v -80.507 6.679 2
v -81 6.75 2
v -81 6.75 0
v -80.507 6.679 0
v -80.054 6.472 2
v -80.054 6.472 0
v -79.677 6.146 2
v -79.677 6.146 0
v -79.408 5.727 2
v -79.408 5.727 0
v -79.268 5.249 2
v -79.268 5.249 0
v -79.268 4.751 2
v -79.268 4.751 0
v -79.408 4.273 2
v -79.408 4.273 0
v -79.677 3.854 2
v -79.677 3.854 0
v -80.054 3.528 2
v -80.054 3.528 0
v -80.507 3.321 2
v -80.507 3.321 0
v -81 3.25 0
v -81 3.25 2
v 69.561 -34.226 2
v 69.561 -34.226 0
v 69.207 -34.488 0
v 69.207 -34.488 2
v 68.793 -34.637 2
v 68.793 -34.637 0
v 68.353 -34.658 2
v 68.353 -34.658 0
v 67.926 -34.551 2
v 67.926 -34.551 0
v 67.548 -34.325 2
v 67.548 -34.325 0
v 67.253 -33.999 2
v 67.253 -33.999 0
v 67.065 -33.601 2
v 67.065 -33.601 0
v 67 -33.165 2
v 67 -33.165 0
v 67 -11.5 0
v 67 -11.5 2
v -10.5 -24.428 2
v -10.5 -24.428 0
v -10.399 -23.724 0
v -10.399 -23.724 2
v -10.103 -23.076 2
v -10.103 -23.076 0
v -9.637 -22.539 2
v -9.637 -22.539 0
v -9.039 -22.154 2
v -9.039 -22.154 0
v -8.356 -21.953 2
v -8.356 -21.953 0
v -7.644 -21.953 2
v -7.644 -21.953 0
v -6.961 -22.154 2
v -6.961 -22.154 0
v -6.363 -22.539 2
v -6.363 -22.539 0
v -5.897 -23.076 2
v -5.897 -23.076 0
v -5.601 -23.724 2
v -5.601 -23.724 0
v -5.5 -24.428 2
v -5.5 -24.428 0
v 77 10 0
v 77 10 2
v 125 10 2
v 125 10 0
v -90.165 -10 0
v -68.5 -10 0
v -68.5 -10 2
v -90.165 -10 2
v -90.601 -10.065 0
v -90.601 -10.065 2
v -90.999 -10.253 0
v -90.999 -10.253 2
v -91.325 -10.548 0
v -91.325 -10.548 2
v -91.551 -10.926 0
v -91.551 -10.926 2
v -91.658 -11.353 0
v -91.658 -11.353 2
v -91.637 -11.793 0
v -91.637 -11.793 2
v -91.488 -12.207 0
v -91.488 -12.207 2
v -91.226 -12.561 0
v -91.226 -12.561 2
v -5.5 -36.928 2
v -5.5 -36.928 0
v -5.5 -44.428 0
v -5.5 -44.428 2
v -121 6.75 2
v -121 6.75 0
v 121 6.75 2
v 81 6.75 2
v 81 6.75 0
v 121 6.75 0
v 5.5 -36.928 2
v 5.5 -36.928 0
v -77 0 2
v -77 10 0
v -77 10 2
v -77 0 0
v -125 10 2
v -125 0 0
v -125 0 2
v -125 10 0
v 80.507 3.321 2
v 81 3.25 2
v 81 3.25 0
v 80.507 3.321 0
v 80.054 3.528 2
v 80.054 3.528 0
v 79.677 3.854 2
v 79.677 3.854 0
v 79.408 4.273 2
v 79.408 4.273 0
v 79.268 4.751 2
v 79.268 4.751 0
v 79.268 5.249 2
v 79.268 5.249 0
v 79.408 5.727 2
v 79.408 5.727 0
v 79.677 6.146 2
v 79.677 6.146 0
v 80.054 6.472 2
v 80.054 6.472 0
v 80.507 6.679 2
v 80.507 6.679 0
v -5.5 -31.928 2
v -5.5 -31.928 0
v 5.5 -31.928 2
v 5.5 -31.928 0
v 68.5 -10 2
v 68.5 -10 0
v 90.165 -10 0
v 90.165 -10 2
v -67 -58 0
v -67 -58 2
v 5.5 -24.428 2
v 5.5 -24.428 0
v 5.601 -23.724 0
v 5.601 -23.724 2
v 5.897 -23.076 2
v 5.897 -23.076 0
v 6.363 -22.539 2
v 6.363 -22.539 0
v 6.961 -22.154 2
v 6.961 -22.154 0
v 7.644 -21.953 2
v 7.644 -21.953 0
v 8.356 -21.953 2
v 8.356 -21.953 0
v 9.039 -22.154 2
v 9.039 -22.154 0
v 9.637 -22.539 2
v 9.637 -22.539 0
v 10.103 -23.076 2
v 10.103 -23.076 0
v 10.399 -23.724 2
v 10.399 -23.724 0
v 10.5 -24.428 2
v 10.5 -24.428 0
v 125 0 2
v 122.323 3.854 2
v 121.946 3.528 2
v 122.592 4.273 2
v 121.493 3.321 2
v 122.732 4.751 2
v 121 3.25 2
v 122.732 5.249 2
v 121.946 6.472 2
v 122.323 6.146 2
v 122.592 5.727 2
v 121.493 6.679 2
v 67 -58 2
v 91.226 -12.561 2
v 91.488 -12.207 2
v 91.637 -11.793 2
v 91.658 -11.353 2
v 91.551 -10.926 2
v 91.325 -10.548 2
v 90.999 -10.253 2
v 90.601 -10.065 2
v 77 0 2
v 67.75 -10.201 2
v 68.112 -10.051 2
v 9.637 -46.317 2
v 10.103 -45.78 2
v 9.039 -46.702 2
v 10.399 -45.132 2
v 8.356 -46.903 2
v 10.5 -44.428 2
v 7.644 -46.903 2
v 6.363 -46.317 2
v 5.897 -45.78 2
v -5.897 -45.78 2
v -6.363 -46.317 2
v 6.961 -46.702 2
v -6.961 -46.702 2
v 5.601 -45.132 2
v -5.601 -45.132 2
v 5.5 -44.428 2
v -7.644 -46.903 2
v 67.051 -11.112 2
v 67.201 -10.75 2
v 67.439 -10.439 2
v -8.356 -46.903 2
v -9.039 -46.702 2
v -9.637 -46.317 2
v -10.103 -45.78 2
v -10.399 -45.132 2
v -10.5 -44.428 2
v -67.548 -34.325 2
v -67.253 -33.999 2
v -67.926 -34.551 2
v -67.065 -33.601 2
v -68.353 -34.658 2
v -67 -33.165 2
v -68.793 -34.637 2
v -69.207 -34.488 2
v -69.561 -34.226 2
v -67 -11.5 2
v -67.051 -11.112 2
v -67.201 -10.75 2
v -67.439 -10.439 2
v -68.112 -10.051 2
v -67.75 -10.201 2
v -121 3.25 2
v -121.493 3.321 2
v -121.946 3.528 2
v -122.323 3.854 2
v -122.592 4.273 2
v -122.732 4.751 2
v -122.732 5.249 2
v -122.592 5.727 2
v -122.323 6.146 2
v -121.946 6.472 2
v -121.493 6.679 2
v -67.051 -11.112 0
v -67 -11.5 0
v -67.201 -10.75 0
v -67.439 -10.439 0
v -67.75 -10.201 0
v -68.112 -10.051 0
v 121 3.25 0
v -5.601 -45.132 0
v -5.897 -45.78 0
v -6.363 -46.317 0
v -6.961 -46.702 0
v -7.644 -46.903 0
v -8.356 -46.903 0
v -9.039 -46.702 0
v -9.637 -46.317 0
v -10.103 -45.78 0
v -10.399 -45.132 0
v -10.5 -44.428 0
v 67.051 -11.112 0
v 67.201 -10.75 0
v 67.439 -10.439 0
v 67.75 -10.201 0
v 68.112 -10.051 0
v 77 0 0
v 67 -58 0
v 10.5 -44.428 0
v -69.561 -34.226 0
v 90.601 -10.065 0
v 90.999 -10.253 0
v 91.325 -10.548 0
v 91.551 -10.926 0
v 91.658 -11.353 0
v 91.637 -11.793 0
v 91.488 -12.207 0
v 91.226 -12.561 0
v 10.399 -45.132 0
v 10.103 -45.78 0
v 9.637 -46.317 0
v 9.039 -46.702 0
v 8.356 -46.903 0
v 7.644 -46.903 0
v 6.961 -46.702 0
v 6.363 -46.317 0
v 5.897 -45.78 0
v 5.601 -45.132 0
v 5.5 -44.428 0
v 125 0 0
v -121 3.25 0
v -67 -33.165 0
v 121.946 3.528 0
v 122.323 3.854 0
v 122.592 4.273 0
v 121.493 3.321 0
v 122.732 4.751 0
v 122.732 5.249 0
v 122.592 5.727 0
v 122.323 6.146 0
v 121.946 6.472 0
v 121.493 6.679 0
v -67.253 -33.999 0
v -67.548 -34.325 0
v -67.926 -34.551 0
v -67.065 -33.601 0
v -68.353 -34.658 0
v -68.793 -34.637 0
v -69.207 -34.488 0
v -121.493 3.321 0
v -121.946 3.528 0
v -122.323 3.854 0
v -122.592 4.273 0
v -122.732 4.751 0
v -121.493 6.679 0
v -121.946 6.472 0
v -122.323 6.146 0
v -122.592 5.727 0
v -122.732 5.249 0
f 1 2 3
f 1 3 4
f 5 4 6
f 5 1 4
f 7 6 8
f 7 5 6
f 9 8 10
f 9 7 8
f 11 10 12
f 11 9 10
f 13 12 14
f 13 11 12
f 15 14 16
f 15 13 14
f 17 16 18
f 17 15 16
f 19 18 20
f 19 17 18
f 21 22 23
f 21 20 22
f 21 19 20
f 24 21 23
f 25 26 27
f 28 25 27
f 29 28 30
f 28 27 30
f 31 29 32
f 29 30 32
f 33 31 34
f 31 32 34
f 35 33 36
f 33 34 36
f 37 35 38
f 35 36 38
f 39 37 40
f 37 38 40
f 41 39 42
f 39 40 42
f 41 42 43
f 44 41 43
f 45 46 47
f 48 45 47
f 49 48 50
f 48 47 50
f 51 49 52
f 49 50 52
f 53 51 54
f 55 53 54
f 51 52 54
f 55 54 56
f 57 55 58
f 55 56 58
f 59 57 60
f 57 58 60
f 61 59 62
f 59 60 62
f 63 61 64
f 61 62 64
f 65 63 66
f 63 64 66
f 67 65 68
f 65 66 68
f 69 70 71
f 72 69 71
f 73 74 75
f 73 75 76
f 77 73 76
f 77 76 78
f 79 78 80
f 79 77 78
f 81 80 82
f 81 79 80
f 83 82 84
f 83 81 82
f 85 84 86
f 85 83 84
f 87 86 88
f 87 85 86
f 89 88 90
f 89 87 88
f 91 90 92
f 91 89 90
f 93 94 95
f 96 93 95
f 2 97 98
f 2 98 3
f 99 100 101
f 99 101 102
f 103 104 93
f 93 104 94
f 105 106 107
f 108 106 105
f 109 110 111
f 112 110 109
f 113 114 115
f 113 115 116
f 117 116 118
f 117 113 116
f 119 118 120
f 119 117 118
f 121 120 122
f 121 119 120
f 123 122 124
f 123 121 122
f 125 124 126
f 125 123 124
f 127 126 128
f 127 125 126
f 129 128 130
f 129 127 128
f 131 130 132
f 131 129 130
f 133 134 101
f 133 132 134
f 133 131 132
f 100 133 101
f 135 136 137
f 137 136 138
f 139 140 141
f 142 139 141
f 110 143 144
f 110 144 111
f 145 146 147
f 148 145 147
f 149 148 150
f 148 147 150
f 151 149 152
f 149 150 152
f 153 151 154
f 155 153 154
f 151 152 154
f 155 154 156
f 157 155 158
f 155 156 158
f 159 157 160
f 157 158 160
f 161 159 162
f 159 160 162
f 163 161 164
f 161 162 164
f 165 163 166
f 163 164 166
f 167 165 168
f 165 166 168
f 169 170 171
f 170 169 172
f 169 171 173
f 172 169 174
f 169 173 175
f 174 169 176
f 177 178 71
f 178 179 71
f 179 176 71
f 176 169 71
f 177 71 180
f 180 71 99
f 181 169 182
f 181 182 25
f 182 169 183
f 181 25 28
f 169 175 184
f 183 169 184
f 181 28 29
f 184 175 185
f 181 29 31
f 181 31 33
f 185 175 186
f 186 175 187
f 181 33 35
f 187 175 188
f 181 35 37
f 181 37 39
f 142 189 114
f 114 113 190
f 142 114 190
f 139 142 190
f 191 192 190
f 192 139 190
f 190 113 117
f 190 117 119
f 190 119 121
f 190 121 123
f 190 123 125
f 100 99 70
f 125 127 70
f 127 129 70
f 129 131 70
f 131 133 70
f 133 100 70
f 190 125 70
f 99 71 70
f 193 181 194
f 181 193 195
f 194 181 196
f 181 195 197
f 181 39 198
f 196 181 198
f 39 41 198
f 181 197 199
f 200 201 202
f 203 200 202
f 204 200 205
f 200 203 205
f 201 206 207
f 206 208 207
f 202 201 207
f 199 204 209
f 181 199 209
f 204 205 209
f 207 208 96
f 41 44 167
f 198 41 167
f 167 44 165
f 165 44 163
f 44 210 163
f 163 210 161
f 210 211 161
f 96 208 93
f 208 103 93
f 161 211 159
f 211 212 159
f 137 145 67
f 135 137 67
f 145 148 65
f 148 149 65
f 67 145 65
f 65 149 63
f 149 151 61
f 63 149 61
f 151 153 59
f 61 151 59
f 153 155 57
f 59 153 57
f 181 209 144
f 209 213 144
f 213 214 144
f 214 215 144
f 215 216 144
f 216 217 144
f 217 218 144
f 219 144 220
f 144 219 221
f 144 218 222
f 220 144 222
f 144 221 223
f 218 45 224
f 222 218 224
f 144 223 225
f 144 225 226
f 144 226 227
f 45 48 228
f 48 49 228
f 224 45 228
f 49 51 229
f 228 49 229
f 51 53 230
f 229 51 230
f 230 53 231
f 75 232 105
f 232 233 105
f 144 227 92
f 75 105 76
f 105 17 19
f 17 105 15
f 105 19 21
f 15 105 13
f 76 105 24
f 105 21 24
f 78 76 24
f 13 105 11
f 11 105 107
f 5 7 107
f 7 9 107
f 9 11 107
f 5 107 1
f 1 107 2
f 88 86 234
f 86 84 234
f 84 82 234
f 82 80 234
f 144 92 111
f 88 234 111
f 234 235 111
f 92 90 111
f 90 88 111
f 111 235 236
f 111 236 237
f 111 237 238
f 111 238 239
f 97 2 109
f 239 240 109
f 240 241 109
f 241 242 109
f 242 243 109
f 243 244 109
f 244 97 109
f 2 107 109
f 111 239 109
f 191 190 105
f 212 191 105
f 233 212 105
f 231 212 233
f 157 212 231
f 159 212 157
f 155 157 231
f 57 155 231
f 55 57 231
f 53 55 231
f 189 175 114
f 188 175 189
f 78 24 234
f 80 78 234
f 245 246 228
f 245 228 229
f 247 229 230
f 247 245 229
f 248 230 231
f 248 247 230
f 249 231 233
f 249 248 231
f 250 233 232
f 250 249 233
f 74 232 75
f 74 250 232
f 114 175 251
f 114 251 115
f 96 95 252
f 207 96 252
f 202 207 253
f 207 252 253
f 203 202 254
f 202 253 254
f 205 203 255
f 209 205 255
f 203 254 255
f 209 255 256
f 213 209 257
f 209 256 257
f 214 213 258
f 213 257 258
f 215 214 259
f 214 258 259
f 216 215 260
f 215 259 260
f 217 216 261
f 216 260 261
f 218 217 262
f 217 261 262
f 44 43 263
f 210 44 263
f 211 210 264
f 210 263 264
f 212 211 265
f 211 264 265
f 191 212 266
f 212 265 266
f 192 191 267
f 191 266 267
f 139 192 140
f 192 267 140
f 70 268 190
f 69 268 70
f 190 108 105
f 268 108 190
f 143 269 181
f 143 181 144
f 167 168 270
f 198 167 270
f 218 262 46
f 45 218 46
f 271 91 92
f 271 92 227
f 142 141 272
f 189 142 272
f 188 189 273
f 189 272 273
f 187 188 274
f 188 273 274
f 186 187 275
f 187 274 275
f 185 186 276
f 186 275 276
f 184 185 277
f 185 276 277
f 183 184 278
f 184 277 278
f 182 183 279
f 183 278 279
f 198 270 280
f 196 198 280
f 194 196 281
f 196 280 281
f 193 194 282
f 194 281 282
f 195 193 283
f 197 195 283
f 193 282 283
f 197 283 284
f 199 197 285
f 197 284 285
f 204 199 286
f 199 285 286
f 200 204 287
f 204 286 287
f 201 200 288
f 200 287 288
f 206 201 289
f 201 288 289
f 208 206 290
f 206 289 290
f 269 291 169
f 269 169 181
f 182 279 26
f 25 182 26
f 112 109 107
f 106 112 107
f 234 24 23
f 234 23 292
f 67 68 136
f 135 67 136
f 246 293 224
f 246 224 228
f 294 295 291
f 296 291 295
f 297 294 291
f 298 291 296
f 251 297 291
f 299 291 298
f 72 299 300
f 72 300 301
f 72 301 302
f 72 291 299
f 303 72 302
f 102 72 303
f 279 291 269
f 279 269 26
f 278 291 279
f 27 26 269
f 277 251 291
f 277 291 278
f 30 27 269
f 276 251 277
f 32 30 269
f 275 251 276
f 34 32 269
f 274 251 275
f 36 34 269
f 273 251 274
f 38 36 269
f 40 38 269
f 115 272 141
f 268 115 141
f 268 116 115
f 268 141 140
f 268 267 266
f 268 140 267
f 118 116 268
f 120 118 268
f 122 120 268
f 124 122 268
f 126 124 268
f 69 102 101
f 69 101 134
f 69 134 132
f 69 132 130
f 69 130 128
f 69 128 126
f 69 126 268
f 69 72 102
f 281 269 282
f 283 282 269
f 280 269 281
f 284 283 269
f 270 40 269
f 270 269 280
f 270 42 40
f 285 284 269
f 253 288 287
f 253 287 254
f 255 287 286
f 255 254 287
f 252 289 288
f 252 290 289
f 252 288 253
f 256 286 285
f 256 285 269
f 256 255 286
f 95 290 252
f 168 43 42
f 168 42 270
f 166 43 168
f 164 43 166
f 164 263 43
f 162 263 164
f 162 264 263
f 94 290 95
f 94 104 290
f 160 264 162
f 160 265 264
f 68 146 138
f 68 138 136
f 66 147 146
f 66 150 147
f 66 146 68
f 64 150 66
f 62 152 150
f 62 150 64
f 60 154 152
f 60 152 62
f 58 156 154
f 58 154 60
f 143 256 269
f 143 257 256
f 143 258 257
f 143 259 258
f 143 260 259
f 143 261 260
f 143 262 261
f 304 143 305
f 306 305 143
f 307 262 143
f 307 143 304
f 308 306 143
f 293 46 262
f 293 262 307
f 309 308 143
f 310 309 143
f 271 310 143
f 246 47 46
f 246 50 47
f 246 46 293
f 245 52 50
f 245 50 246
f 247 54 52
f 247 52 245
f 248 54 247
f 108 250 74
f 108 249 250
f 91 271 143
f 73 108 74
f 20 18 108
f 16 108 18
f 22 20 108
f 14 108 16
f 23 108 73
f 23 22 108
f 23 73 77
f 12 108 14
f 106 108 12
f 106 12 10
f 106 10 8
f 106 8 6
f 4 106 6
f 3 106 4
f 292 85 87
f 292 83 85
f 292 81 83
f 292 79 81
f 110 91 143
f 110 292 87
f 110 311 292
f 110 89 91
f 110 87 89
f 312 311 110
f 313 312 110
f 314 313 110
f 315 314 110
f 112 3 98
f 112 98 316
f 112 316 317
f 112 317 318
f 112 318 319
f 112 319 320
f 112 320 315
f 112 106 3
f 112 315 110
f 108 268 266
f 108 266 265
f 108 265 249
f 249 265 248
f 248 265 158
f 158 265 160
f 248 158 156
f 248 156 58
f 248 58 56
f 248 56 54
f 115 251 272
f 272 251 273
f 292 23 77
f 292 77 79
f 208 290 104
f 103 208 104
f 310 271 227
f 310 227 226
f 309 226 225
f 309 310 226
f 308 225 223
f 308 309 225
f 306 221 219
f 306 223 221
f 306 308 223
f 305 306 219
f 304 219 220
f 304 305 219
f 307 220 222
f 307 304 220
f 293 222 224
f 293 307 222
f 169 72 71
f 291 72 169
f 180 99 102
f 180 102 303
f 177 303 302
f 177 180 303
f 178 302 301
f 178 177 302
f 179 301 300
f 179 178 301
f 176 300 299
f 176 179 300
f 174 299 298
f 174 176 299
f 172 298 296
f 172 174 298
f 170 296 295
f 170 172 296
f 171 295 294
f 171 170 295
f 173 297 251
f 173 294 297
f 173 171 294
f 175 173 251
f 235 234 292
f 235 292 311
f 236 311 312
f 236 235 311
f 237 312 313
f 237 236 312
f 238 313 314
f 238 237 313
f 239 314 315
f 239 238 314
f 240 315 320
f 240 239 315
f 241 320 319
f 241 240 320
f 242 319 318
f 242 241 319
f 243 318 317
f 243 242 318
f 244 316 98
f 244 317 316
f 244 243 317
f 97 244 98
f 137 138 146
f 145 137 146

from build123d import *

# Parameters (mm, degrees)
SKETCH_1_R               = 1.5
EXTRUDE_1_DEPTH          = 2
SKETCH_3_W               = 250
SKETCH_3_H               = 20
CUT_EXTRUDE_2_DEPTH      = 138.815093513
CUT_EXTRUDE_3_DEPTH      = 138.815093513
CUT_EXTRUDE_3_DEPTH_BACK = 138.815093513
CUT_EXTRUDE_4_DEPTH      = 138.815093513


with BuildPart() as part:
    # 草图1 → 凸台-拉伸1 (new body)
    with BuildSketch(Plane.XY):
        Polygon((-77, 30), (-77, 0), (77, 0), (77, 30), (125, 30), (125, 0), (67, -58), (-67, -58), (-125, 0), (-125, 30), align=None)
        with Locations((-121, 25)):
            Circle(SKETCH_1_R, mode=Mode.SUBTRACT)
        with Locations((-81, 25)):
            Circle(SKETCH_1_R, mode=Mode.SUBTRACT)
        with Locations((-81, 5)):
            Circle(SKETCH_1_R, mode=Mode.SUBTRACT)
        with Locations((-121, 5)):
            Circle(SKETCH_1_R, mode=Mode.SUBTRACT)
        with Locations(Location((121, 5, 0), (0, 0, 180))):
            Circle(SKETCH_1_R, mode=Mode.SUBTRACT)
        with Locations(Location((81, 5, 0), (0, 0, 180))):
            Circle(SKETCH_1_R, mode=Mode.SUBTRACT)
        with Locations(Location((81, 25, 0), (0, 0, 180))):
            Circle(SKETCH_1_R, mode=Mode.SUBTRACT)
        with Locations(Location((121, 25, 0), (0, 0, 180))):
            Circle(SKETCH_1_R, mode=Mode.SUBTRACT)
    extrude(amount=EXTRUDE_1_DEPTH)

    # 草图3 → 切除-拉伸2 (cut, through all)
    with BuildSketch(Plane.XY.offset(2)):
        with Locations((0, 20)):
            Rectangle(SKETCH_3_W, SKETCH_3_H)
    extrude(amount=-CUT_EXTRUDE_2_DEPTH, mode=Mode.SUBTRACT)

    # 草图4 → 切除-拉伸3 (cut, two sides: drawn at the far end of the back side and taken through both)
    with BuildSketch(Plane.XY.offset(2).offset(-CUT_EXTRUDE_3_DEPTH_BACK)):
        with BuildLine():
            Line((-91.226136393, -12.560660172), (-69.560660172, -34.226136393))
            ThreePointArc((-69.560660172, -34.226136393), (-67.925974851, -34.55129552), (-67, -33.165476221))
            Line((-67, -33.165476221), (-67, -11.5))
            ThreePointArc((-67, -11.5), (-67.439339828, -10.439339828), (-68.5, -10))
            Line((-68.5, -10), (-90.165476221, -10))
            ThreePointArc((-90.165476221, -10), (-91.55129552, -10.925974851), (-91.226136393, -12.560660172))
        make_face()
        with BuildLine():
            Line((68.5, -10), (90.165476221, -10))
            ThreePointArc((90.165476221, -10), (91.55129552, -10.925974851), (91.226136393, -12.560660172))
            Line((91.226136393, -12.560660172), (69.560660172, -34.226136393))
            ThreePointArc((69.560660172, -34.226136393), (67.925974851, -34.55129552), (67, -33.165476221))
            Line((67, -33.165476221), (67, -11.5))
            ThreePointArc((67, -11.5), (67.439339828, -10.439339828), (68.5, -10))
        make_face()
        with BuildLine():
            Line((-5.5, -36.928047473), (-5.5, -44.428047473))
            ThreePointArc((-5.5, -44.428047473), (-8, -46.928047473), (-10.5, -44.428047473))
            Line((-10.5, -44.428047473), (-10.5, -24.428047473))
            ThreePointArc((-10.5, -24.428047473), (-8, -21.928047473), (-5.5, -24.428047473))
            Line((-5.5, -24.428047473), (-5.5, -31.928047473))
            Line((-5.5, -31.928047473), (5.5, -31.928047473))
            Line((5.5, -31.928047473), (5.5, -24.428047473))
            ThreePointArc((5.5, -24.428047473), (8, -21.928047473), (10.5, -24.428047473))
            Line((10.5, -24.428047473), (10.5, -44.428047473))
            ThreePointArc((10.5, -44.428047473), (8, -46.928047473), (5.5, -44.428047473))
            Line((5.5, -44.428047473), (5.5, -36.928047473))
            Line((5.5, -36.928047473), (-5.5, -36.928047473))
        make_face()
    extrude(amount=CUT_EXTRUDE_3_DEPTH + CUT_EXTRUDE_3_DEPTH_BACK, mode=Mode.SUBTRACT)

    # 草图5 → 切除-拉伸4 (cut, through all)
    with BuildSketch(Plane.XY.offset(2)):
        with BuildLine():
            Line((-121, 6.75), (-81, 6.75))
            ThreePointArc((-81, 6.75), (-79.25, 5), (-81, 3.25))
            Line((-81, 3.25), (-121, 3.25))
            ThreePointArc((-121, 3.25), (-122.75, 5), (-121, 6.75))
        make_face()
        with BuildLine():
            Line((81, 6.75), (121, 6.75))
            ThreePointArc((121, 6.75), (122.75, 5), (121, 3.25))
            Line((121, 3.25), (81, 3.25))
            ThreePointArc((81, 3.25), (79.25, 5), (81, 6.75))
        make_face()
    extrude(amount=-CUT_EXTRUDE_4_DEPTH, mode=Mode.SUBTRACT)


solid = part.part
